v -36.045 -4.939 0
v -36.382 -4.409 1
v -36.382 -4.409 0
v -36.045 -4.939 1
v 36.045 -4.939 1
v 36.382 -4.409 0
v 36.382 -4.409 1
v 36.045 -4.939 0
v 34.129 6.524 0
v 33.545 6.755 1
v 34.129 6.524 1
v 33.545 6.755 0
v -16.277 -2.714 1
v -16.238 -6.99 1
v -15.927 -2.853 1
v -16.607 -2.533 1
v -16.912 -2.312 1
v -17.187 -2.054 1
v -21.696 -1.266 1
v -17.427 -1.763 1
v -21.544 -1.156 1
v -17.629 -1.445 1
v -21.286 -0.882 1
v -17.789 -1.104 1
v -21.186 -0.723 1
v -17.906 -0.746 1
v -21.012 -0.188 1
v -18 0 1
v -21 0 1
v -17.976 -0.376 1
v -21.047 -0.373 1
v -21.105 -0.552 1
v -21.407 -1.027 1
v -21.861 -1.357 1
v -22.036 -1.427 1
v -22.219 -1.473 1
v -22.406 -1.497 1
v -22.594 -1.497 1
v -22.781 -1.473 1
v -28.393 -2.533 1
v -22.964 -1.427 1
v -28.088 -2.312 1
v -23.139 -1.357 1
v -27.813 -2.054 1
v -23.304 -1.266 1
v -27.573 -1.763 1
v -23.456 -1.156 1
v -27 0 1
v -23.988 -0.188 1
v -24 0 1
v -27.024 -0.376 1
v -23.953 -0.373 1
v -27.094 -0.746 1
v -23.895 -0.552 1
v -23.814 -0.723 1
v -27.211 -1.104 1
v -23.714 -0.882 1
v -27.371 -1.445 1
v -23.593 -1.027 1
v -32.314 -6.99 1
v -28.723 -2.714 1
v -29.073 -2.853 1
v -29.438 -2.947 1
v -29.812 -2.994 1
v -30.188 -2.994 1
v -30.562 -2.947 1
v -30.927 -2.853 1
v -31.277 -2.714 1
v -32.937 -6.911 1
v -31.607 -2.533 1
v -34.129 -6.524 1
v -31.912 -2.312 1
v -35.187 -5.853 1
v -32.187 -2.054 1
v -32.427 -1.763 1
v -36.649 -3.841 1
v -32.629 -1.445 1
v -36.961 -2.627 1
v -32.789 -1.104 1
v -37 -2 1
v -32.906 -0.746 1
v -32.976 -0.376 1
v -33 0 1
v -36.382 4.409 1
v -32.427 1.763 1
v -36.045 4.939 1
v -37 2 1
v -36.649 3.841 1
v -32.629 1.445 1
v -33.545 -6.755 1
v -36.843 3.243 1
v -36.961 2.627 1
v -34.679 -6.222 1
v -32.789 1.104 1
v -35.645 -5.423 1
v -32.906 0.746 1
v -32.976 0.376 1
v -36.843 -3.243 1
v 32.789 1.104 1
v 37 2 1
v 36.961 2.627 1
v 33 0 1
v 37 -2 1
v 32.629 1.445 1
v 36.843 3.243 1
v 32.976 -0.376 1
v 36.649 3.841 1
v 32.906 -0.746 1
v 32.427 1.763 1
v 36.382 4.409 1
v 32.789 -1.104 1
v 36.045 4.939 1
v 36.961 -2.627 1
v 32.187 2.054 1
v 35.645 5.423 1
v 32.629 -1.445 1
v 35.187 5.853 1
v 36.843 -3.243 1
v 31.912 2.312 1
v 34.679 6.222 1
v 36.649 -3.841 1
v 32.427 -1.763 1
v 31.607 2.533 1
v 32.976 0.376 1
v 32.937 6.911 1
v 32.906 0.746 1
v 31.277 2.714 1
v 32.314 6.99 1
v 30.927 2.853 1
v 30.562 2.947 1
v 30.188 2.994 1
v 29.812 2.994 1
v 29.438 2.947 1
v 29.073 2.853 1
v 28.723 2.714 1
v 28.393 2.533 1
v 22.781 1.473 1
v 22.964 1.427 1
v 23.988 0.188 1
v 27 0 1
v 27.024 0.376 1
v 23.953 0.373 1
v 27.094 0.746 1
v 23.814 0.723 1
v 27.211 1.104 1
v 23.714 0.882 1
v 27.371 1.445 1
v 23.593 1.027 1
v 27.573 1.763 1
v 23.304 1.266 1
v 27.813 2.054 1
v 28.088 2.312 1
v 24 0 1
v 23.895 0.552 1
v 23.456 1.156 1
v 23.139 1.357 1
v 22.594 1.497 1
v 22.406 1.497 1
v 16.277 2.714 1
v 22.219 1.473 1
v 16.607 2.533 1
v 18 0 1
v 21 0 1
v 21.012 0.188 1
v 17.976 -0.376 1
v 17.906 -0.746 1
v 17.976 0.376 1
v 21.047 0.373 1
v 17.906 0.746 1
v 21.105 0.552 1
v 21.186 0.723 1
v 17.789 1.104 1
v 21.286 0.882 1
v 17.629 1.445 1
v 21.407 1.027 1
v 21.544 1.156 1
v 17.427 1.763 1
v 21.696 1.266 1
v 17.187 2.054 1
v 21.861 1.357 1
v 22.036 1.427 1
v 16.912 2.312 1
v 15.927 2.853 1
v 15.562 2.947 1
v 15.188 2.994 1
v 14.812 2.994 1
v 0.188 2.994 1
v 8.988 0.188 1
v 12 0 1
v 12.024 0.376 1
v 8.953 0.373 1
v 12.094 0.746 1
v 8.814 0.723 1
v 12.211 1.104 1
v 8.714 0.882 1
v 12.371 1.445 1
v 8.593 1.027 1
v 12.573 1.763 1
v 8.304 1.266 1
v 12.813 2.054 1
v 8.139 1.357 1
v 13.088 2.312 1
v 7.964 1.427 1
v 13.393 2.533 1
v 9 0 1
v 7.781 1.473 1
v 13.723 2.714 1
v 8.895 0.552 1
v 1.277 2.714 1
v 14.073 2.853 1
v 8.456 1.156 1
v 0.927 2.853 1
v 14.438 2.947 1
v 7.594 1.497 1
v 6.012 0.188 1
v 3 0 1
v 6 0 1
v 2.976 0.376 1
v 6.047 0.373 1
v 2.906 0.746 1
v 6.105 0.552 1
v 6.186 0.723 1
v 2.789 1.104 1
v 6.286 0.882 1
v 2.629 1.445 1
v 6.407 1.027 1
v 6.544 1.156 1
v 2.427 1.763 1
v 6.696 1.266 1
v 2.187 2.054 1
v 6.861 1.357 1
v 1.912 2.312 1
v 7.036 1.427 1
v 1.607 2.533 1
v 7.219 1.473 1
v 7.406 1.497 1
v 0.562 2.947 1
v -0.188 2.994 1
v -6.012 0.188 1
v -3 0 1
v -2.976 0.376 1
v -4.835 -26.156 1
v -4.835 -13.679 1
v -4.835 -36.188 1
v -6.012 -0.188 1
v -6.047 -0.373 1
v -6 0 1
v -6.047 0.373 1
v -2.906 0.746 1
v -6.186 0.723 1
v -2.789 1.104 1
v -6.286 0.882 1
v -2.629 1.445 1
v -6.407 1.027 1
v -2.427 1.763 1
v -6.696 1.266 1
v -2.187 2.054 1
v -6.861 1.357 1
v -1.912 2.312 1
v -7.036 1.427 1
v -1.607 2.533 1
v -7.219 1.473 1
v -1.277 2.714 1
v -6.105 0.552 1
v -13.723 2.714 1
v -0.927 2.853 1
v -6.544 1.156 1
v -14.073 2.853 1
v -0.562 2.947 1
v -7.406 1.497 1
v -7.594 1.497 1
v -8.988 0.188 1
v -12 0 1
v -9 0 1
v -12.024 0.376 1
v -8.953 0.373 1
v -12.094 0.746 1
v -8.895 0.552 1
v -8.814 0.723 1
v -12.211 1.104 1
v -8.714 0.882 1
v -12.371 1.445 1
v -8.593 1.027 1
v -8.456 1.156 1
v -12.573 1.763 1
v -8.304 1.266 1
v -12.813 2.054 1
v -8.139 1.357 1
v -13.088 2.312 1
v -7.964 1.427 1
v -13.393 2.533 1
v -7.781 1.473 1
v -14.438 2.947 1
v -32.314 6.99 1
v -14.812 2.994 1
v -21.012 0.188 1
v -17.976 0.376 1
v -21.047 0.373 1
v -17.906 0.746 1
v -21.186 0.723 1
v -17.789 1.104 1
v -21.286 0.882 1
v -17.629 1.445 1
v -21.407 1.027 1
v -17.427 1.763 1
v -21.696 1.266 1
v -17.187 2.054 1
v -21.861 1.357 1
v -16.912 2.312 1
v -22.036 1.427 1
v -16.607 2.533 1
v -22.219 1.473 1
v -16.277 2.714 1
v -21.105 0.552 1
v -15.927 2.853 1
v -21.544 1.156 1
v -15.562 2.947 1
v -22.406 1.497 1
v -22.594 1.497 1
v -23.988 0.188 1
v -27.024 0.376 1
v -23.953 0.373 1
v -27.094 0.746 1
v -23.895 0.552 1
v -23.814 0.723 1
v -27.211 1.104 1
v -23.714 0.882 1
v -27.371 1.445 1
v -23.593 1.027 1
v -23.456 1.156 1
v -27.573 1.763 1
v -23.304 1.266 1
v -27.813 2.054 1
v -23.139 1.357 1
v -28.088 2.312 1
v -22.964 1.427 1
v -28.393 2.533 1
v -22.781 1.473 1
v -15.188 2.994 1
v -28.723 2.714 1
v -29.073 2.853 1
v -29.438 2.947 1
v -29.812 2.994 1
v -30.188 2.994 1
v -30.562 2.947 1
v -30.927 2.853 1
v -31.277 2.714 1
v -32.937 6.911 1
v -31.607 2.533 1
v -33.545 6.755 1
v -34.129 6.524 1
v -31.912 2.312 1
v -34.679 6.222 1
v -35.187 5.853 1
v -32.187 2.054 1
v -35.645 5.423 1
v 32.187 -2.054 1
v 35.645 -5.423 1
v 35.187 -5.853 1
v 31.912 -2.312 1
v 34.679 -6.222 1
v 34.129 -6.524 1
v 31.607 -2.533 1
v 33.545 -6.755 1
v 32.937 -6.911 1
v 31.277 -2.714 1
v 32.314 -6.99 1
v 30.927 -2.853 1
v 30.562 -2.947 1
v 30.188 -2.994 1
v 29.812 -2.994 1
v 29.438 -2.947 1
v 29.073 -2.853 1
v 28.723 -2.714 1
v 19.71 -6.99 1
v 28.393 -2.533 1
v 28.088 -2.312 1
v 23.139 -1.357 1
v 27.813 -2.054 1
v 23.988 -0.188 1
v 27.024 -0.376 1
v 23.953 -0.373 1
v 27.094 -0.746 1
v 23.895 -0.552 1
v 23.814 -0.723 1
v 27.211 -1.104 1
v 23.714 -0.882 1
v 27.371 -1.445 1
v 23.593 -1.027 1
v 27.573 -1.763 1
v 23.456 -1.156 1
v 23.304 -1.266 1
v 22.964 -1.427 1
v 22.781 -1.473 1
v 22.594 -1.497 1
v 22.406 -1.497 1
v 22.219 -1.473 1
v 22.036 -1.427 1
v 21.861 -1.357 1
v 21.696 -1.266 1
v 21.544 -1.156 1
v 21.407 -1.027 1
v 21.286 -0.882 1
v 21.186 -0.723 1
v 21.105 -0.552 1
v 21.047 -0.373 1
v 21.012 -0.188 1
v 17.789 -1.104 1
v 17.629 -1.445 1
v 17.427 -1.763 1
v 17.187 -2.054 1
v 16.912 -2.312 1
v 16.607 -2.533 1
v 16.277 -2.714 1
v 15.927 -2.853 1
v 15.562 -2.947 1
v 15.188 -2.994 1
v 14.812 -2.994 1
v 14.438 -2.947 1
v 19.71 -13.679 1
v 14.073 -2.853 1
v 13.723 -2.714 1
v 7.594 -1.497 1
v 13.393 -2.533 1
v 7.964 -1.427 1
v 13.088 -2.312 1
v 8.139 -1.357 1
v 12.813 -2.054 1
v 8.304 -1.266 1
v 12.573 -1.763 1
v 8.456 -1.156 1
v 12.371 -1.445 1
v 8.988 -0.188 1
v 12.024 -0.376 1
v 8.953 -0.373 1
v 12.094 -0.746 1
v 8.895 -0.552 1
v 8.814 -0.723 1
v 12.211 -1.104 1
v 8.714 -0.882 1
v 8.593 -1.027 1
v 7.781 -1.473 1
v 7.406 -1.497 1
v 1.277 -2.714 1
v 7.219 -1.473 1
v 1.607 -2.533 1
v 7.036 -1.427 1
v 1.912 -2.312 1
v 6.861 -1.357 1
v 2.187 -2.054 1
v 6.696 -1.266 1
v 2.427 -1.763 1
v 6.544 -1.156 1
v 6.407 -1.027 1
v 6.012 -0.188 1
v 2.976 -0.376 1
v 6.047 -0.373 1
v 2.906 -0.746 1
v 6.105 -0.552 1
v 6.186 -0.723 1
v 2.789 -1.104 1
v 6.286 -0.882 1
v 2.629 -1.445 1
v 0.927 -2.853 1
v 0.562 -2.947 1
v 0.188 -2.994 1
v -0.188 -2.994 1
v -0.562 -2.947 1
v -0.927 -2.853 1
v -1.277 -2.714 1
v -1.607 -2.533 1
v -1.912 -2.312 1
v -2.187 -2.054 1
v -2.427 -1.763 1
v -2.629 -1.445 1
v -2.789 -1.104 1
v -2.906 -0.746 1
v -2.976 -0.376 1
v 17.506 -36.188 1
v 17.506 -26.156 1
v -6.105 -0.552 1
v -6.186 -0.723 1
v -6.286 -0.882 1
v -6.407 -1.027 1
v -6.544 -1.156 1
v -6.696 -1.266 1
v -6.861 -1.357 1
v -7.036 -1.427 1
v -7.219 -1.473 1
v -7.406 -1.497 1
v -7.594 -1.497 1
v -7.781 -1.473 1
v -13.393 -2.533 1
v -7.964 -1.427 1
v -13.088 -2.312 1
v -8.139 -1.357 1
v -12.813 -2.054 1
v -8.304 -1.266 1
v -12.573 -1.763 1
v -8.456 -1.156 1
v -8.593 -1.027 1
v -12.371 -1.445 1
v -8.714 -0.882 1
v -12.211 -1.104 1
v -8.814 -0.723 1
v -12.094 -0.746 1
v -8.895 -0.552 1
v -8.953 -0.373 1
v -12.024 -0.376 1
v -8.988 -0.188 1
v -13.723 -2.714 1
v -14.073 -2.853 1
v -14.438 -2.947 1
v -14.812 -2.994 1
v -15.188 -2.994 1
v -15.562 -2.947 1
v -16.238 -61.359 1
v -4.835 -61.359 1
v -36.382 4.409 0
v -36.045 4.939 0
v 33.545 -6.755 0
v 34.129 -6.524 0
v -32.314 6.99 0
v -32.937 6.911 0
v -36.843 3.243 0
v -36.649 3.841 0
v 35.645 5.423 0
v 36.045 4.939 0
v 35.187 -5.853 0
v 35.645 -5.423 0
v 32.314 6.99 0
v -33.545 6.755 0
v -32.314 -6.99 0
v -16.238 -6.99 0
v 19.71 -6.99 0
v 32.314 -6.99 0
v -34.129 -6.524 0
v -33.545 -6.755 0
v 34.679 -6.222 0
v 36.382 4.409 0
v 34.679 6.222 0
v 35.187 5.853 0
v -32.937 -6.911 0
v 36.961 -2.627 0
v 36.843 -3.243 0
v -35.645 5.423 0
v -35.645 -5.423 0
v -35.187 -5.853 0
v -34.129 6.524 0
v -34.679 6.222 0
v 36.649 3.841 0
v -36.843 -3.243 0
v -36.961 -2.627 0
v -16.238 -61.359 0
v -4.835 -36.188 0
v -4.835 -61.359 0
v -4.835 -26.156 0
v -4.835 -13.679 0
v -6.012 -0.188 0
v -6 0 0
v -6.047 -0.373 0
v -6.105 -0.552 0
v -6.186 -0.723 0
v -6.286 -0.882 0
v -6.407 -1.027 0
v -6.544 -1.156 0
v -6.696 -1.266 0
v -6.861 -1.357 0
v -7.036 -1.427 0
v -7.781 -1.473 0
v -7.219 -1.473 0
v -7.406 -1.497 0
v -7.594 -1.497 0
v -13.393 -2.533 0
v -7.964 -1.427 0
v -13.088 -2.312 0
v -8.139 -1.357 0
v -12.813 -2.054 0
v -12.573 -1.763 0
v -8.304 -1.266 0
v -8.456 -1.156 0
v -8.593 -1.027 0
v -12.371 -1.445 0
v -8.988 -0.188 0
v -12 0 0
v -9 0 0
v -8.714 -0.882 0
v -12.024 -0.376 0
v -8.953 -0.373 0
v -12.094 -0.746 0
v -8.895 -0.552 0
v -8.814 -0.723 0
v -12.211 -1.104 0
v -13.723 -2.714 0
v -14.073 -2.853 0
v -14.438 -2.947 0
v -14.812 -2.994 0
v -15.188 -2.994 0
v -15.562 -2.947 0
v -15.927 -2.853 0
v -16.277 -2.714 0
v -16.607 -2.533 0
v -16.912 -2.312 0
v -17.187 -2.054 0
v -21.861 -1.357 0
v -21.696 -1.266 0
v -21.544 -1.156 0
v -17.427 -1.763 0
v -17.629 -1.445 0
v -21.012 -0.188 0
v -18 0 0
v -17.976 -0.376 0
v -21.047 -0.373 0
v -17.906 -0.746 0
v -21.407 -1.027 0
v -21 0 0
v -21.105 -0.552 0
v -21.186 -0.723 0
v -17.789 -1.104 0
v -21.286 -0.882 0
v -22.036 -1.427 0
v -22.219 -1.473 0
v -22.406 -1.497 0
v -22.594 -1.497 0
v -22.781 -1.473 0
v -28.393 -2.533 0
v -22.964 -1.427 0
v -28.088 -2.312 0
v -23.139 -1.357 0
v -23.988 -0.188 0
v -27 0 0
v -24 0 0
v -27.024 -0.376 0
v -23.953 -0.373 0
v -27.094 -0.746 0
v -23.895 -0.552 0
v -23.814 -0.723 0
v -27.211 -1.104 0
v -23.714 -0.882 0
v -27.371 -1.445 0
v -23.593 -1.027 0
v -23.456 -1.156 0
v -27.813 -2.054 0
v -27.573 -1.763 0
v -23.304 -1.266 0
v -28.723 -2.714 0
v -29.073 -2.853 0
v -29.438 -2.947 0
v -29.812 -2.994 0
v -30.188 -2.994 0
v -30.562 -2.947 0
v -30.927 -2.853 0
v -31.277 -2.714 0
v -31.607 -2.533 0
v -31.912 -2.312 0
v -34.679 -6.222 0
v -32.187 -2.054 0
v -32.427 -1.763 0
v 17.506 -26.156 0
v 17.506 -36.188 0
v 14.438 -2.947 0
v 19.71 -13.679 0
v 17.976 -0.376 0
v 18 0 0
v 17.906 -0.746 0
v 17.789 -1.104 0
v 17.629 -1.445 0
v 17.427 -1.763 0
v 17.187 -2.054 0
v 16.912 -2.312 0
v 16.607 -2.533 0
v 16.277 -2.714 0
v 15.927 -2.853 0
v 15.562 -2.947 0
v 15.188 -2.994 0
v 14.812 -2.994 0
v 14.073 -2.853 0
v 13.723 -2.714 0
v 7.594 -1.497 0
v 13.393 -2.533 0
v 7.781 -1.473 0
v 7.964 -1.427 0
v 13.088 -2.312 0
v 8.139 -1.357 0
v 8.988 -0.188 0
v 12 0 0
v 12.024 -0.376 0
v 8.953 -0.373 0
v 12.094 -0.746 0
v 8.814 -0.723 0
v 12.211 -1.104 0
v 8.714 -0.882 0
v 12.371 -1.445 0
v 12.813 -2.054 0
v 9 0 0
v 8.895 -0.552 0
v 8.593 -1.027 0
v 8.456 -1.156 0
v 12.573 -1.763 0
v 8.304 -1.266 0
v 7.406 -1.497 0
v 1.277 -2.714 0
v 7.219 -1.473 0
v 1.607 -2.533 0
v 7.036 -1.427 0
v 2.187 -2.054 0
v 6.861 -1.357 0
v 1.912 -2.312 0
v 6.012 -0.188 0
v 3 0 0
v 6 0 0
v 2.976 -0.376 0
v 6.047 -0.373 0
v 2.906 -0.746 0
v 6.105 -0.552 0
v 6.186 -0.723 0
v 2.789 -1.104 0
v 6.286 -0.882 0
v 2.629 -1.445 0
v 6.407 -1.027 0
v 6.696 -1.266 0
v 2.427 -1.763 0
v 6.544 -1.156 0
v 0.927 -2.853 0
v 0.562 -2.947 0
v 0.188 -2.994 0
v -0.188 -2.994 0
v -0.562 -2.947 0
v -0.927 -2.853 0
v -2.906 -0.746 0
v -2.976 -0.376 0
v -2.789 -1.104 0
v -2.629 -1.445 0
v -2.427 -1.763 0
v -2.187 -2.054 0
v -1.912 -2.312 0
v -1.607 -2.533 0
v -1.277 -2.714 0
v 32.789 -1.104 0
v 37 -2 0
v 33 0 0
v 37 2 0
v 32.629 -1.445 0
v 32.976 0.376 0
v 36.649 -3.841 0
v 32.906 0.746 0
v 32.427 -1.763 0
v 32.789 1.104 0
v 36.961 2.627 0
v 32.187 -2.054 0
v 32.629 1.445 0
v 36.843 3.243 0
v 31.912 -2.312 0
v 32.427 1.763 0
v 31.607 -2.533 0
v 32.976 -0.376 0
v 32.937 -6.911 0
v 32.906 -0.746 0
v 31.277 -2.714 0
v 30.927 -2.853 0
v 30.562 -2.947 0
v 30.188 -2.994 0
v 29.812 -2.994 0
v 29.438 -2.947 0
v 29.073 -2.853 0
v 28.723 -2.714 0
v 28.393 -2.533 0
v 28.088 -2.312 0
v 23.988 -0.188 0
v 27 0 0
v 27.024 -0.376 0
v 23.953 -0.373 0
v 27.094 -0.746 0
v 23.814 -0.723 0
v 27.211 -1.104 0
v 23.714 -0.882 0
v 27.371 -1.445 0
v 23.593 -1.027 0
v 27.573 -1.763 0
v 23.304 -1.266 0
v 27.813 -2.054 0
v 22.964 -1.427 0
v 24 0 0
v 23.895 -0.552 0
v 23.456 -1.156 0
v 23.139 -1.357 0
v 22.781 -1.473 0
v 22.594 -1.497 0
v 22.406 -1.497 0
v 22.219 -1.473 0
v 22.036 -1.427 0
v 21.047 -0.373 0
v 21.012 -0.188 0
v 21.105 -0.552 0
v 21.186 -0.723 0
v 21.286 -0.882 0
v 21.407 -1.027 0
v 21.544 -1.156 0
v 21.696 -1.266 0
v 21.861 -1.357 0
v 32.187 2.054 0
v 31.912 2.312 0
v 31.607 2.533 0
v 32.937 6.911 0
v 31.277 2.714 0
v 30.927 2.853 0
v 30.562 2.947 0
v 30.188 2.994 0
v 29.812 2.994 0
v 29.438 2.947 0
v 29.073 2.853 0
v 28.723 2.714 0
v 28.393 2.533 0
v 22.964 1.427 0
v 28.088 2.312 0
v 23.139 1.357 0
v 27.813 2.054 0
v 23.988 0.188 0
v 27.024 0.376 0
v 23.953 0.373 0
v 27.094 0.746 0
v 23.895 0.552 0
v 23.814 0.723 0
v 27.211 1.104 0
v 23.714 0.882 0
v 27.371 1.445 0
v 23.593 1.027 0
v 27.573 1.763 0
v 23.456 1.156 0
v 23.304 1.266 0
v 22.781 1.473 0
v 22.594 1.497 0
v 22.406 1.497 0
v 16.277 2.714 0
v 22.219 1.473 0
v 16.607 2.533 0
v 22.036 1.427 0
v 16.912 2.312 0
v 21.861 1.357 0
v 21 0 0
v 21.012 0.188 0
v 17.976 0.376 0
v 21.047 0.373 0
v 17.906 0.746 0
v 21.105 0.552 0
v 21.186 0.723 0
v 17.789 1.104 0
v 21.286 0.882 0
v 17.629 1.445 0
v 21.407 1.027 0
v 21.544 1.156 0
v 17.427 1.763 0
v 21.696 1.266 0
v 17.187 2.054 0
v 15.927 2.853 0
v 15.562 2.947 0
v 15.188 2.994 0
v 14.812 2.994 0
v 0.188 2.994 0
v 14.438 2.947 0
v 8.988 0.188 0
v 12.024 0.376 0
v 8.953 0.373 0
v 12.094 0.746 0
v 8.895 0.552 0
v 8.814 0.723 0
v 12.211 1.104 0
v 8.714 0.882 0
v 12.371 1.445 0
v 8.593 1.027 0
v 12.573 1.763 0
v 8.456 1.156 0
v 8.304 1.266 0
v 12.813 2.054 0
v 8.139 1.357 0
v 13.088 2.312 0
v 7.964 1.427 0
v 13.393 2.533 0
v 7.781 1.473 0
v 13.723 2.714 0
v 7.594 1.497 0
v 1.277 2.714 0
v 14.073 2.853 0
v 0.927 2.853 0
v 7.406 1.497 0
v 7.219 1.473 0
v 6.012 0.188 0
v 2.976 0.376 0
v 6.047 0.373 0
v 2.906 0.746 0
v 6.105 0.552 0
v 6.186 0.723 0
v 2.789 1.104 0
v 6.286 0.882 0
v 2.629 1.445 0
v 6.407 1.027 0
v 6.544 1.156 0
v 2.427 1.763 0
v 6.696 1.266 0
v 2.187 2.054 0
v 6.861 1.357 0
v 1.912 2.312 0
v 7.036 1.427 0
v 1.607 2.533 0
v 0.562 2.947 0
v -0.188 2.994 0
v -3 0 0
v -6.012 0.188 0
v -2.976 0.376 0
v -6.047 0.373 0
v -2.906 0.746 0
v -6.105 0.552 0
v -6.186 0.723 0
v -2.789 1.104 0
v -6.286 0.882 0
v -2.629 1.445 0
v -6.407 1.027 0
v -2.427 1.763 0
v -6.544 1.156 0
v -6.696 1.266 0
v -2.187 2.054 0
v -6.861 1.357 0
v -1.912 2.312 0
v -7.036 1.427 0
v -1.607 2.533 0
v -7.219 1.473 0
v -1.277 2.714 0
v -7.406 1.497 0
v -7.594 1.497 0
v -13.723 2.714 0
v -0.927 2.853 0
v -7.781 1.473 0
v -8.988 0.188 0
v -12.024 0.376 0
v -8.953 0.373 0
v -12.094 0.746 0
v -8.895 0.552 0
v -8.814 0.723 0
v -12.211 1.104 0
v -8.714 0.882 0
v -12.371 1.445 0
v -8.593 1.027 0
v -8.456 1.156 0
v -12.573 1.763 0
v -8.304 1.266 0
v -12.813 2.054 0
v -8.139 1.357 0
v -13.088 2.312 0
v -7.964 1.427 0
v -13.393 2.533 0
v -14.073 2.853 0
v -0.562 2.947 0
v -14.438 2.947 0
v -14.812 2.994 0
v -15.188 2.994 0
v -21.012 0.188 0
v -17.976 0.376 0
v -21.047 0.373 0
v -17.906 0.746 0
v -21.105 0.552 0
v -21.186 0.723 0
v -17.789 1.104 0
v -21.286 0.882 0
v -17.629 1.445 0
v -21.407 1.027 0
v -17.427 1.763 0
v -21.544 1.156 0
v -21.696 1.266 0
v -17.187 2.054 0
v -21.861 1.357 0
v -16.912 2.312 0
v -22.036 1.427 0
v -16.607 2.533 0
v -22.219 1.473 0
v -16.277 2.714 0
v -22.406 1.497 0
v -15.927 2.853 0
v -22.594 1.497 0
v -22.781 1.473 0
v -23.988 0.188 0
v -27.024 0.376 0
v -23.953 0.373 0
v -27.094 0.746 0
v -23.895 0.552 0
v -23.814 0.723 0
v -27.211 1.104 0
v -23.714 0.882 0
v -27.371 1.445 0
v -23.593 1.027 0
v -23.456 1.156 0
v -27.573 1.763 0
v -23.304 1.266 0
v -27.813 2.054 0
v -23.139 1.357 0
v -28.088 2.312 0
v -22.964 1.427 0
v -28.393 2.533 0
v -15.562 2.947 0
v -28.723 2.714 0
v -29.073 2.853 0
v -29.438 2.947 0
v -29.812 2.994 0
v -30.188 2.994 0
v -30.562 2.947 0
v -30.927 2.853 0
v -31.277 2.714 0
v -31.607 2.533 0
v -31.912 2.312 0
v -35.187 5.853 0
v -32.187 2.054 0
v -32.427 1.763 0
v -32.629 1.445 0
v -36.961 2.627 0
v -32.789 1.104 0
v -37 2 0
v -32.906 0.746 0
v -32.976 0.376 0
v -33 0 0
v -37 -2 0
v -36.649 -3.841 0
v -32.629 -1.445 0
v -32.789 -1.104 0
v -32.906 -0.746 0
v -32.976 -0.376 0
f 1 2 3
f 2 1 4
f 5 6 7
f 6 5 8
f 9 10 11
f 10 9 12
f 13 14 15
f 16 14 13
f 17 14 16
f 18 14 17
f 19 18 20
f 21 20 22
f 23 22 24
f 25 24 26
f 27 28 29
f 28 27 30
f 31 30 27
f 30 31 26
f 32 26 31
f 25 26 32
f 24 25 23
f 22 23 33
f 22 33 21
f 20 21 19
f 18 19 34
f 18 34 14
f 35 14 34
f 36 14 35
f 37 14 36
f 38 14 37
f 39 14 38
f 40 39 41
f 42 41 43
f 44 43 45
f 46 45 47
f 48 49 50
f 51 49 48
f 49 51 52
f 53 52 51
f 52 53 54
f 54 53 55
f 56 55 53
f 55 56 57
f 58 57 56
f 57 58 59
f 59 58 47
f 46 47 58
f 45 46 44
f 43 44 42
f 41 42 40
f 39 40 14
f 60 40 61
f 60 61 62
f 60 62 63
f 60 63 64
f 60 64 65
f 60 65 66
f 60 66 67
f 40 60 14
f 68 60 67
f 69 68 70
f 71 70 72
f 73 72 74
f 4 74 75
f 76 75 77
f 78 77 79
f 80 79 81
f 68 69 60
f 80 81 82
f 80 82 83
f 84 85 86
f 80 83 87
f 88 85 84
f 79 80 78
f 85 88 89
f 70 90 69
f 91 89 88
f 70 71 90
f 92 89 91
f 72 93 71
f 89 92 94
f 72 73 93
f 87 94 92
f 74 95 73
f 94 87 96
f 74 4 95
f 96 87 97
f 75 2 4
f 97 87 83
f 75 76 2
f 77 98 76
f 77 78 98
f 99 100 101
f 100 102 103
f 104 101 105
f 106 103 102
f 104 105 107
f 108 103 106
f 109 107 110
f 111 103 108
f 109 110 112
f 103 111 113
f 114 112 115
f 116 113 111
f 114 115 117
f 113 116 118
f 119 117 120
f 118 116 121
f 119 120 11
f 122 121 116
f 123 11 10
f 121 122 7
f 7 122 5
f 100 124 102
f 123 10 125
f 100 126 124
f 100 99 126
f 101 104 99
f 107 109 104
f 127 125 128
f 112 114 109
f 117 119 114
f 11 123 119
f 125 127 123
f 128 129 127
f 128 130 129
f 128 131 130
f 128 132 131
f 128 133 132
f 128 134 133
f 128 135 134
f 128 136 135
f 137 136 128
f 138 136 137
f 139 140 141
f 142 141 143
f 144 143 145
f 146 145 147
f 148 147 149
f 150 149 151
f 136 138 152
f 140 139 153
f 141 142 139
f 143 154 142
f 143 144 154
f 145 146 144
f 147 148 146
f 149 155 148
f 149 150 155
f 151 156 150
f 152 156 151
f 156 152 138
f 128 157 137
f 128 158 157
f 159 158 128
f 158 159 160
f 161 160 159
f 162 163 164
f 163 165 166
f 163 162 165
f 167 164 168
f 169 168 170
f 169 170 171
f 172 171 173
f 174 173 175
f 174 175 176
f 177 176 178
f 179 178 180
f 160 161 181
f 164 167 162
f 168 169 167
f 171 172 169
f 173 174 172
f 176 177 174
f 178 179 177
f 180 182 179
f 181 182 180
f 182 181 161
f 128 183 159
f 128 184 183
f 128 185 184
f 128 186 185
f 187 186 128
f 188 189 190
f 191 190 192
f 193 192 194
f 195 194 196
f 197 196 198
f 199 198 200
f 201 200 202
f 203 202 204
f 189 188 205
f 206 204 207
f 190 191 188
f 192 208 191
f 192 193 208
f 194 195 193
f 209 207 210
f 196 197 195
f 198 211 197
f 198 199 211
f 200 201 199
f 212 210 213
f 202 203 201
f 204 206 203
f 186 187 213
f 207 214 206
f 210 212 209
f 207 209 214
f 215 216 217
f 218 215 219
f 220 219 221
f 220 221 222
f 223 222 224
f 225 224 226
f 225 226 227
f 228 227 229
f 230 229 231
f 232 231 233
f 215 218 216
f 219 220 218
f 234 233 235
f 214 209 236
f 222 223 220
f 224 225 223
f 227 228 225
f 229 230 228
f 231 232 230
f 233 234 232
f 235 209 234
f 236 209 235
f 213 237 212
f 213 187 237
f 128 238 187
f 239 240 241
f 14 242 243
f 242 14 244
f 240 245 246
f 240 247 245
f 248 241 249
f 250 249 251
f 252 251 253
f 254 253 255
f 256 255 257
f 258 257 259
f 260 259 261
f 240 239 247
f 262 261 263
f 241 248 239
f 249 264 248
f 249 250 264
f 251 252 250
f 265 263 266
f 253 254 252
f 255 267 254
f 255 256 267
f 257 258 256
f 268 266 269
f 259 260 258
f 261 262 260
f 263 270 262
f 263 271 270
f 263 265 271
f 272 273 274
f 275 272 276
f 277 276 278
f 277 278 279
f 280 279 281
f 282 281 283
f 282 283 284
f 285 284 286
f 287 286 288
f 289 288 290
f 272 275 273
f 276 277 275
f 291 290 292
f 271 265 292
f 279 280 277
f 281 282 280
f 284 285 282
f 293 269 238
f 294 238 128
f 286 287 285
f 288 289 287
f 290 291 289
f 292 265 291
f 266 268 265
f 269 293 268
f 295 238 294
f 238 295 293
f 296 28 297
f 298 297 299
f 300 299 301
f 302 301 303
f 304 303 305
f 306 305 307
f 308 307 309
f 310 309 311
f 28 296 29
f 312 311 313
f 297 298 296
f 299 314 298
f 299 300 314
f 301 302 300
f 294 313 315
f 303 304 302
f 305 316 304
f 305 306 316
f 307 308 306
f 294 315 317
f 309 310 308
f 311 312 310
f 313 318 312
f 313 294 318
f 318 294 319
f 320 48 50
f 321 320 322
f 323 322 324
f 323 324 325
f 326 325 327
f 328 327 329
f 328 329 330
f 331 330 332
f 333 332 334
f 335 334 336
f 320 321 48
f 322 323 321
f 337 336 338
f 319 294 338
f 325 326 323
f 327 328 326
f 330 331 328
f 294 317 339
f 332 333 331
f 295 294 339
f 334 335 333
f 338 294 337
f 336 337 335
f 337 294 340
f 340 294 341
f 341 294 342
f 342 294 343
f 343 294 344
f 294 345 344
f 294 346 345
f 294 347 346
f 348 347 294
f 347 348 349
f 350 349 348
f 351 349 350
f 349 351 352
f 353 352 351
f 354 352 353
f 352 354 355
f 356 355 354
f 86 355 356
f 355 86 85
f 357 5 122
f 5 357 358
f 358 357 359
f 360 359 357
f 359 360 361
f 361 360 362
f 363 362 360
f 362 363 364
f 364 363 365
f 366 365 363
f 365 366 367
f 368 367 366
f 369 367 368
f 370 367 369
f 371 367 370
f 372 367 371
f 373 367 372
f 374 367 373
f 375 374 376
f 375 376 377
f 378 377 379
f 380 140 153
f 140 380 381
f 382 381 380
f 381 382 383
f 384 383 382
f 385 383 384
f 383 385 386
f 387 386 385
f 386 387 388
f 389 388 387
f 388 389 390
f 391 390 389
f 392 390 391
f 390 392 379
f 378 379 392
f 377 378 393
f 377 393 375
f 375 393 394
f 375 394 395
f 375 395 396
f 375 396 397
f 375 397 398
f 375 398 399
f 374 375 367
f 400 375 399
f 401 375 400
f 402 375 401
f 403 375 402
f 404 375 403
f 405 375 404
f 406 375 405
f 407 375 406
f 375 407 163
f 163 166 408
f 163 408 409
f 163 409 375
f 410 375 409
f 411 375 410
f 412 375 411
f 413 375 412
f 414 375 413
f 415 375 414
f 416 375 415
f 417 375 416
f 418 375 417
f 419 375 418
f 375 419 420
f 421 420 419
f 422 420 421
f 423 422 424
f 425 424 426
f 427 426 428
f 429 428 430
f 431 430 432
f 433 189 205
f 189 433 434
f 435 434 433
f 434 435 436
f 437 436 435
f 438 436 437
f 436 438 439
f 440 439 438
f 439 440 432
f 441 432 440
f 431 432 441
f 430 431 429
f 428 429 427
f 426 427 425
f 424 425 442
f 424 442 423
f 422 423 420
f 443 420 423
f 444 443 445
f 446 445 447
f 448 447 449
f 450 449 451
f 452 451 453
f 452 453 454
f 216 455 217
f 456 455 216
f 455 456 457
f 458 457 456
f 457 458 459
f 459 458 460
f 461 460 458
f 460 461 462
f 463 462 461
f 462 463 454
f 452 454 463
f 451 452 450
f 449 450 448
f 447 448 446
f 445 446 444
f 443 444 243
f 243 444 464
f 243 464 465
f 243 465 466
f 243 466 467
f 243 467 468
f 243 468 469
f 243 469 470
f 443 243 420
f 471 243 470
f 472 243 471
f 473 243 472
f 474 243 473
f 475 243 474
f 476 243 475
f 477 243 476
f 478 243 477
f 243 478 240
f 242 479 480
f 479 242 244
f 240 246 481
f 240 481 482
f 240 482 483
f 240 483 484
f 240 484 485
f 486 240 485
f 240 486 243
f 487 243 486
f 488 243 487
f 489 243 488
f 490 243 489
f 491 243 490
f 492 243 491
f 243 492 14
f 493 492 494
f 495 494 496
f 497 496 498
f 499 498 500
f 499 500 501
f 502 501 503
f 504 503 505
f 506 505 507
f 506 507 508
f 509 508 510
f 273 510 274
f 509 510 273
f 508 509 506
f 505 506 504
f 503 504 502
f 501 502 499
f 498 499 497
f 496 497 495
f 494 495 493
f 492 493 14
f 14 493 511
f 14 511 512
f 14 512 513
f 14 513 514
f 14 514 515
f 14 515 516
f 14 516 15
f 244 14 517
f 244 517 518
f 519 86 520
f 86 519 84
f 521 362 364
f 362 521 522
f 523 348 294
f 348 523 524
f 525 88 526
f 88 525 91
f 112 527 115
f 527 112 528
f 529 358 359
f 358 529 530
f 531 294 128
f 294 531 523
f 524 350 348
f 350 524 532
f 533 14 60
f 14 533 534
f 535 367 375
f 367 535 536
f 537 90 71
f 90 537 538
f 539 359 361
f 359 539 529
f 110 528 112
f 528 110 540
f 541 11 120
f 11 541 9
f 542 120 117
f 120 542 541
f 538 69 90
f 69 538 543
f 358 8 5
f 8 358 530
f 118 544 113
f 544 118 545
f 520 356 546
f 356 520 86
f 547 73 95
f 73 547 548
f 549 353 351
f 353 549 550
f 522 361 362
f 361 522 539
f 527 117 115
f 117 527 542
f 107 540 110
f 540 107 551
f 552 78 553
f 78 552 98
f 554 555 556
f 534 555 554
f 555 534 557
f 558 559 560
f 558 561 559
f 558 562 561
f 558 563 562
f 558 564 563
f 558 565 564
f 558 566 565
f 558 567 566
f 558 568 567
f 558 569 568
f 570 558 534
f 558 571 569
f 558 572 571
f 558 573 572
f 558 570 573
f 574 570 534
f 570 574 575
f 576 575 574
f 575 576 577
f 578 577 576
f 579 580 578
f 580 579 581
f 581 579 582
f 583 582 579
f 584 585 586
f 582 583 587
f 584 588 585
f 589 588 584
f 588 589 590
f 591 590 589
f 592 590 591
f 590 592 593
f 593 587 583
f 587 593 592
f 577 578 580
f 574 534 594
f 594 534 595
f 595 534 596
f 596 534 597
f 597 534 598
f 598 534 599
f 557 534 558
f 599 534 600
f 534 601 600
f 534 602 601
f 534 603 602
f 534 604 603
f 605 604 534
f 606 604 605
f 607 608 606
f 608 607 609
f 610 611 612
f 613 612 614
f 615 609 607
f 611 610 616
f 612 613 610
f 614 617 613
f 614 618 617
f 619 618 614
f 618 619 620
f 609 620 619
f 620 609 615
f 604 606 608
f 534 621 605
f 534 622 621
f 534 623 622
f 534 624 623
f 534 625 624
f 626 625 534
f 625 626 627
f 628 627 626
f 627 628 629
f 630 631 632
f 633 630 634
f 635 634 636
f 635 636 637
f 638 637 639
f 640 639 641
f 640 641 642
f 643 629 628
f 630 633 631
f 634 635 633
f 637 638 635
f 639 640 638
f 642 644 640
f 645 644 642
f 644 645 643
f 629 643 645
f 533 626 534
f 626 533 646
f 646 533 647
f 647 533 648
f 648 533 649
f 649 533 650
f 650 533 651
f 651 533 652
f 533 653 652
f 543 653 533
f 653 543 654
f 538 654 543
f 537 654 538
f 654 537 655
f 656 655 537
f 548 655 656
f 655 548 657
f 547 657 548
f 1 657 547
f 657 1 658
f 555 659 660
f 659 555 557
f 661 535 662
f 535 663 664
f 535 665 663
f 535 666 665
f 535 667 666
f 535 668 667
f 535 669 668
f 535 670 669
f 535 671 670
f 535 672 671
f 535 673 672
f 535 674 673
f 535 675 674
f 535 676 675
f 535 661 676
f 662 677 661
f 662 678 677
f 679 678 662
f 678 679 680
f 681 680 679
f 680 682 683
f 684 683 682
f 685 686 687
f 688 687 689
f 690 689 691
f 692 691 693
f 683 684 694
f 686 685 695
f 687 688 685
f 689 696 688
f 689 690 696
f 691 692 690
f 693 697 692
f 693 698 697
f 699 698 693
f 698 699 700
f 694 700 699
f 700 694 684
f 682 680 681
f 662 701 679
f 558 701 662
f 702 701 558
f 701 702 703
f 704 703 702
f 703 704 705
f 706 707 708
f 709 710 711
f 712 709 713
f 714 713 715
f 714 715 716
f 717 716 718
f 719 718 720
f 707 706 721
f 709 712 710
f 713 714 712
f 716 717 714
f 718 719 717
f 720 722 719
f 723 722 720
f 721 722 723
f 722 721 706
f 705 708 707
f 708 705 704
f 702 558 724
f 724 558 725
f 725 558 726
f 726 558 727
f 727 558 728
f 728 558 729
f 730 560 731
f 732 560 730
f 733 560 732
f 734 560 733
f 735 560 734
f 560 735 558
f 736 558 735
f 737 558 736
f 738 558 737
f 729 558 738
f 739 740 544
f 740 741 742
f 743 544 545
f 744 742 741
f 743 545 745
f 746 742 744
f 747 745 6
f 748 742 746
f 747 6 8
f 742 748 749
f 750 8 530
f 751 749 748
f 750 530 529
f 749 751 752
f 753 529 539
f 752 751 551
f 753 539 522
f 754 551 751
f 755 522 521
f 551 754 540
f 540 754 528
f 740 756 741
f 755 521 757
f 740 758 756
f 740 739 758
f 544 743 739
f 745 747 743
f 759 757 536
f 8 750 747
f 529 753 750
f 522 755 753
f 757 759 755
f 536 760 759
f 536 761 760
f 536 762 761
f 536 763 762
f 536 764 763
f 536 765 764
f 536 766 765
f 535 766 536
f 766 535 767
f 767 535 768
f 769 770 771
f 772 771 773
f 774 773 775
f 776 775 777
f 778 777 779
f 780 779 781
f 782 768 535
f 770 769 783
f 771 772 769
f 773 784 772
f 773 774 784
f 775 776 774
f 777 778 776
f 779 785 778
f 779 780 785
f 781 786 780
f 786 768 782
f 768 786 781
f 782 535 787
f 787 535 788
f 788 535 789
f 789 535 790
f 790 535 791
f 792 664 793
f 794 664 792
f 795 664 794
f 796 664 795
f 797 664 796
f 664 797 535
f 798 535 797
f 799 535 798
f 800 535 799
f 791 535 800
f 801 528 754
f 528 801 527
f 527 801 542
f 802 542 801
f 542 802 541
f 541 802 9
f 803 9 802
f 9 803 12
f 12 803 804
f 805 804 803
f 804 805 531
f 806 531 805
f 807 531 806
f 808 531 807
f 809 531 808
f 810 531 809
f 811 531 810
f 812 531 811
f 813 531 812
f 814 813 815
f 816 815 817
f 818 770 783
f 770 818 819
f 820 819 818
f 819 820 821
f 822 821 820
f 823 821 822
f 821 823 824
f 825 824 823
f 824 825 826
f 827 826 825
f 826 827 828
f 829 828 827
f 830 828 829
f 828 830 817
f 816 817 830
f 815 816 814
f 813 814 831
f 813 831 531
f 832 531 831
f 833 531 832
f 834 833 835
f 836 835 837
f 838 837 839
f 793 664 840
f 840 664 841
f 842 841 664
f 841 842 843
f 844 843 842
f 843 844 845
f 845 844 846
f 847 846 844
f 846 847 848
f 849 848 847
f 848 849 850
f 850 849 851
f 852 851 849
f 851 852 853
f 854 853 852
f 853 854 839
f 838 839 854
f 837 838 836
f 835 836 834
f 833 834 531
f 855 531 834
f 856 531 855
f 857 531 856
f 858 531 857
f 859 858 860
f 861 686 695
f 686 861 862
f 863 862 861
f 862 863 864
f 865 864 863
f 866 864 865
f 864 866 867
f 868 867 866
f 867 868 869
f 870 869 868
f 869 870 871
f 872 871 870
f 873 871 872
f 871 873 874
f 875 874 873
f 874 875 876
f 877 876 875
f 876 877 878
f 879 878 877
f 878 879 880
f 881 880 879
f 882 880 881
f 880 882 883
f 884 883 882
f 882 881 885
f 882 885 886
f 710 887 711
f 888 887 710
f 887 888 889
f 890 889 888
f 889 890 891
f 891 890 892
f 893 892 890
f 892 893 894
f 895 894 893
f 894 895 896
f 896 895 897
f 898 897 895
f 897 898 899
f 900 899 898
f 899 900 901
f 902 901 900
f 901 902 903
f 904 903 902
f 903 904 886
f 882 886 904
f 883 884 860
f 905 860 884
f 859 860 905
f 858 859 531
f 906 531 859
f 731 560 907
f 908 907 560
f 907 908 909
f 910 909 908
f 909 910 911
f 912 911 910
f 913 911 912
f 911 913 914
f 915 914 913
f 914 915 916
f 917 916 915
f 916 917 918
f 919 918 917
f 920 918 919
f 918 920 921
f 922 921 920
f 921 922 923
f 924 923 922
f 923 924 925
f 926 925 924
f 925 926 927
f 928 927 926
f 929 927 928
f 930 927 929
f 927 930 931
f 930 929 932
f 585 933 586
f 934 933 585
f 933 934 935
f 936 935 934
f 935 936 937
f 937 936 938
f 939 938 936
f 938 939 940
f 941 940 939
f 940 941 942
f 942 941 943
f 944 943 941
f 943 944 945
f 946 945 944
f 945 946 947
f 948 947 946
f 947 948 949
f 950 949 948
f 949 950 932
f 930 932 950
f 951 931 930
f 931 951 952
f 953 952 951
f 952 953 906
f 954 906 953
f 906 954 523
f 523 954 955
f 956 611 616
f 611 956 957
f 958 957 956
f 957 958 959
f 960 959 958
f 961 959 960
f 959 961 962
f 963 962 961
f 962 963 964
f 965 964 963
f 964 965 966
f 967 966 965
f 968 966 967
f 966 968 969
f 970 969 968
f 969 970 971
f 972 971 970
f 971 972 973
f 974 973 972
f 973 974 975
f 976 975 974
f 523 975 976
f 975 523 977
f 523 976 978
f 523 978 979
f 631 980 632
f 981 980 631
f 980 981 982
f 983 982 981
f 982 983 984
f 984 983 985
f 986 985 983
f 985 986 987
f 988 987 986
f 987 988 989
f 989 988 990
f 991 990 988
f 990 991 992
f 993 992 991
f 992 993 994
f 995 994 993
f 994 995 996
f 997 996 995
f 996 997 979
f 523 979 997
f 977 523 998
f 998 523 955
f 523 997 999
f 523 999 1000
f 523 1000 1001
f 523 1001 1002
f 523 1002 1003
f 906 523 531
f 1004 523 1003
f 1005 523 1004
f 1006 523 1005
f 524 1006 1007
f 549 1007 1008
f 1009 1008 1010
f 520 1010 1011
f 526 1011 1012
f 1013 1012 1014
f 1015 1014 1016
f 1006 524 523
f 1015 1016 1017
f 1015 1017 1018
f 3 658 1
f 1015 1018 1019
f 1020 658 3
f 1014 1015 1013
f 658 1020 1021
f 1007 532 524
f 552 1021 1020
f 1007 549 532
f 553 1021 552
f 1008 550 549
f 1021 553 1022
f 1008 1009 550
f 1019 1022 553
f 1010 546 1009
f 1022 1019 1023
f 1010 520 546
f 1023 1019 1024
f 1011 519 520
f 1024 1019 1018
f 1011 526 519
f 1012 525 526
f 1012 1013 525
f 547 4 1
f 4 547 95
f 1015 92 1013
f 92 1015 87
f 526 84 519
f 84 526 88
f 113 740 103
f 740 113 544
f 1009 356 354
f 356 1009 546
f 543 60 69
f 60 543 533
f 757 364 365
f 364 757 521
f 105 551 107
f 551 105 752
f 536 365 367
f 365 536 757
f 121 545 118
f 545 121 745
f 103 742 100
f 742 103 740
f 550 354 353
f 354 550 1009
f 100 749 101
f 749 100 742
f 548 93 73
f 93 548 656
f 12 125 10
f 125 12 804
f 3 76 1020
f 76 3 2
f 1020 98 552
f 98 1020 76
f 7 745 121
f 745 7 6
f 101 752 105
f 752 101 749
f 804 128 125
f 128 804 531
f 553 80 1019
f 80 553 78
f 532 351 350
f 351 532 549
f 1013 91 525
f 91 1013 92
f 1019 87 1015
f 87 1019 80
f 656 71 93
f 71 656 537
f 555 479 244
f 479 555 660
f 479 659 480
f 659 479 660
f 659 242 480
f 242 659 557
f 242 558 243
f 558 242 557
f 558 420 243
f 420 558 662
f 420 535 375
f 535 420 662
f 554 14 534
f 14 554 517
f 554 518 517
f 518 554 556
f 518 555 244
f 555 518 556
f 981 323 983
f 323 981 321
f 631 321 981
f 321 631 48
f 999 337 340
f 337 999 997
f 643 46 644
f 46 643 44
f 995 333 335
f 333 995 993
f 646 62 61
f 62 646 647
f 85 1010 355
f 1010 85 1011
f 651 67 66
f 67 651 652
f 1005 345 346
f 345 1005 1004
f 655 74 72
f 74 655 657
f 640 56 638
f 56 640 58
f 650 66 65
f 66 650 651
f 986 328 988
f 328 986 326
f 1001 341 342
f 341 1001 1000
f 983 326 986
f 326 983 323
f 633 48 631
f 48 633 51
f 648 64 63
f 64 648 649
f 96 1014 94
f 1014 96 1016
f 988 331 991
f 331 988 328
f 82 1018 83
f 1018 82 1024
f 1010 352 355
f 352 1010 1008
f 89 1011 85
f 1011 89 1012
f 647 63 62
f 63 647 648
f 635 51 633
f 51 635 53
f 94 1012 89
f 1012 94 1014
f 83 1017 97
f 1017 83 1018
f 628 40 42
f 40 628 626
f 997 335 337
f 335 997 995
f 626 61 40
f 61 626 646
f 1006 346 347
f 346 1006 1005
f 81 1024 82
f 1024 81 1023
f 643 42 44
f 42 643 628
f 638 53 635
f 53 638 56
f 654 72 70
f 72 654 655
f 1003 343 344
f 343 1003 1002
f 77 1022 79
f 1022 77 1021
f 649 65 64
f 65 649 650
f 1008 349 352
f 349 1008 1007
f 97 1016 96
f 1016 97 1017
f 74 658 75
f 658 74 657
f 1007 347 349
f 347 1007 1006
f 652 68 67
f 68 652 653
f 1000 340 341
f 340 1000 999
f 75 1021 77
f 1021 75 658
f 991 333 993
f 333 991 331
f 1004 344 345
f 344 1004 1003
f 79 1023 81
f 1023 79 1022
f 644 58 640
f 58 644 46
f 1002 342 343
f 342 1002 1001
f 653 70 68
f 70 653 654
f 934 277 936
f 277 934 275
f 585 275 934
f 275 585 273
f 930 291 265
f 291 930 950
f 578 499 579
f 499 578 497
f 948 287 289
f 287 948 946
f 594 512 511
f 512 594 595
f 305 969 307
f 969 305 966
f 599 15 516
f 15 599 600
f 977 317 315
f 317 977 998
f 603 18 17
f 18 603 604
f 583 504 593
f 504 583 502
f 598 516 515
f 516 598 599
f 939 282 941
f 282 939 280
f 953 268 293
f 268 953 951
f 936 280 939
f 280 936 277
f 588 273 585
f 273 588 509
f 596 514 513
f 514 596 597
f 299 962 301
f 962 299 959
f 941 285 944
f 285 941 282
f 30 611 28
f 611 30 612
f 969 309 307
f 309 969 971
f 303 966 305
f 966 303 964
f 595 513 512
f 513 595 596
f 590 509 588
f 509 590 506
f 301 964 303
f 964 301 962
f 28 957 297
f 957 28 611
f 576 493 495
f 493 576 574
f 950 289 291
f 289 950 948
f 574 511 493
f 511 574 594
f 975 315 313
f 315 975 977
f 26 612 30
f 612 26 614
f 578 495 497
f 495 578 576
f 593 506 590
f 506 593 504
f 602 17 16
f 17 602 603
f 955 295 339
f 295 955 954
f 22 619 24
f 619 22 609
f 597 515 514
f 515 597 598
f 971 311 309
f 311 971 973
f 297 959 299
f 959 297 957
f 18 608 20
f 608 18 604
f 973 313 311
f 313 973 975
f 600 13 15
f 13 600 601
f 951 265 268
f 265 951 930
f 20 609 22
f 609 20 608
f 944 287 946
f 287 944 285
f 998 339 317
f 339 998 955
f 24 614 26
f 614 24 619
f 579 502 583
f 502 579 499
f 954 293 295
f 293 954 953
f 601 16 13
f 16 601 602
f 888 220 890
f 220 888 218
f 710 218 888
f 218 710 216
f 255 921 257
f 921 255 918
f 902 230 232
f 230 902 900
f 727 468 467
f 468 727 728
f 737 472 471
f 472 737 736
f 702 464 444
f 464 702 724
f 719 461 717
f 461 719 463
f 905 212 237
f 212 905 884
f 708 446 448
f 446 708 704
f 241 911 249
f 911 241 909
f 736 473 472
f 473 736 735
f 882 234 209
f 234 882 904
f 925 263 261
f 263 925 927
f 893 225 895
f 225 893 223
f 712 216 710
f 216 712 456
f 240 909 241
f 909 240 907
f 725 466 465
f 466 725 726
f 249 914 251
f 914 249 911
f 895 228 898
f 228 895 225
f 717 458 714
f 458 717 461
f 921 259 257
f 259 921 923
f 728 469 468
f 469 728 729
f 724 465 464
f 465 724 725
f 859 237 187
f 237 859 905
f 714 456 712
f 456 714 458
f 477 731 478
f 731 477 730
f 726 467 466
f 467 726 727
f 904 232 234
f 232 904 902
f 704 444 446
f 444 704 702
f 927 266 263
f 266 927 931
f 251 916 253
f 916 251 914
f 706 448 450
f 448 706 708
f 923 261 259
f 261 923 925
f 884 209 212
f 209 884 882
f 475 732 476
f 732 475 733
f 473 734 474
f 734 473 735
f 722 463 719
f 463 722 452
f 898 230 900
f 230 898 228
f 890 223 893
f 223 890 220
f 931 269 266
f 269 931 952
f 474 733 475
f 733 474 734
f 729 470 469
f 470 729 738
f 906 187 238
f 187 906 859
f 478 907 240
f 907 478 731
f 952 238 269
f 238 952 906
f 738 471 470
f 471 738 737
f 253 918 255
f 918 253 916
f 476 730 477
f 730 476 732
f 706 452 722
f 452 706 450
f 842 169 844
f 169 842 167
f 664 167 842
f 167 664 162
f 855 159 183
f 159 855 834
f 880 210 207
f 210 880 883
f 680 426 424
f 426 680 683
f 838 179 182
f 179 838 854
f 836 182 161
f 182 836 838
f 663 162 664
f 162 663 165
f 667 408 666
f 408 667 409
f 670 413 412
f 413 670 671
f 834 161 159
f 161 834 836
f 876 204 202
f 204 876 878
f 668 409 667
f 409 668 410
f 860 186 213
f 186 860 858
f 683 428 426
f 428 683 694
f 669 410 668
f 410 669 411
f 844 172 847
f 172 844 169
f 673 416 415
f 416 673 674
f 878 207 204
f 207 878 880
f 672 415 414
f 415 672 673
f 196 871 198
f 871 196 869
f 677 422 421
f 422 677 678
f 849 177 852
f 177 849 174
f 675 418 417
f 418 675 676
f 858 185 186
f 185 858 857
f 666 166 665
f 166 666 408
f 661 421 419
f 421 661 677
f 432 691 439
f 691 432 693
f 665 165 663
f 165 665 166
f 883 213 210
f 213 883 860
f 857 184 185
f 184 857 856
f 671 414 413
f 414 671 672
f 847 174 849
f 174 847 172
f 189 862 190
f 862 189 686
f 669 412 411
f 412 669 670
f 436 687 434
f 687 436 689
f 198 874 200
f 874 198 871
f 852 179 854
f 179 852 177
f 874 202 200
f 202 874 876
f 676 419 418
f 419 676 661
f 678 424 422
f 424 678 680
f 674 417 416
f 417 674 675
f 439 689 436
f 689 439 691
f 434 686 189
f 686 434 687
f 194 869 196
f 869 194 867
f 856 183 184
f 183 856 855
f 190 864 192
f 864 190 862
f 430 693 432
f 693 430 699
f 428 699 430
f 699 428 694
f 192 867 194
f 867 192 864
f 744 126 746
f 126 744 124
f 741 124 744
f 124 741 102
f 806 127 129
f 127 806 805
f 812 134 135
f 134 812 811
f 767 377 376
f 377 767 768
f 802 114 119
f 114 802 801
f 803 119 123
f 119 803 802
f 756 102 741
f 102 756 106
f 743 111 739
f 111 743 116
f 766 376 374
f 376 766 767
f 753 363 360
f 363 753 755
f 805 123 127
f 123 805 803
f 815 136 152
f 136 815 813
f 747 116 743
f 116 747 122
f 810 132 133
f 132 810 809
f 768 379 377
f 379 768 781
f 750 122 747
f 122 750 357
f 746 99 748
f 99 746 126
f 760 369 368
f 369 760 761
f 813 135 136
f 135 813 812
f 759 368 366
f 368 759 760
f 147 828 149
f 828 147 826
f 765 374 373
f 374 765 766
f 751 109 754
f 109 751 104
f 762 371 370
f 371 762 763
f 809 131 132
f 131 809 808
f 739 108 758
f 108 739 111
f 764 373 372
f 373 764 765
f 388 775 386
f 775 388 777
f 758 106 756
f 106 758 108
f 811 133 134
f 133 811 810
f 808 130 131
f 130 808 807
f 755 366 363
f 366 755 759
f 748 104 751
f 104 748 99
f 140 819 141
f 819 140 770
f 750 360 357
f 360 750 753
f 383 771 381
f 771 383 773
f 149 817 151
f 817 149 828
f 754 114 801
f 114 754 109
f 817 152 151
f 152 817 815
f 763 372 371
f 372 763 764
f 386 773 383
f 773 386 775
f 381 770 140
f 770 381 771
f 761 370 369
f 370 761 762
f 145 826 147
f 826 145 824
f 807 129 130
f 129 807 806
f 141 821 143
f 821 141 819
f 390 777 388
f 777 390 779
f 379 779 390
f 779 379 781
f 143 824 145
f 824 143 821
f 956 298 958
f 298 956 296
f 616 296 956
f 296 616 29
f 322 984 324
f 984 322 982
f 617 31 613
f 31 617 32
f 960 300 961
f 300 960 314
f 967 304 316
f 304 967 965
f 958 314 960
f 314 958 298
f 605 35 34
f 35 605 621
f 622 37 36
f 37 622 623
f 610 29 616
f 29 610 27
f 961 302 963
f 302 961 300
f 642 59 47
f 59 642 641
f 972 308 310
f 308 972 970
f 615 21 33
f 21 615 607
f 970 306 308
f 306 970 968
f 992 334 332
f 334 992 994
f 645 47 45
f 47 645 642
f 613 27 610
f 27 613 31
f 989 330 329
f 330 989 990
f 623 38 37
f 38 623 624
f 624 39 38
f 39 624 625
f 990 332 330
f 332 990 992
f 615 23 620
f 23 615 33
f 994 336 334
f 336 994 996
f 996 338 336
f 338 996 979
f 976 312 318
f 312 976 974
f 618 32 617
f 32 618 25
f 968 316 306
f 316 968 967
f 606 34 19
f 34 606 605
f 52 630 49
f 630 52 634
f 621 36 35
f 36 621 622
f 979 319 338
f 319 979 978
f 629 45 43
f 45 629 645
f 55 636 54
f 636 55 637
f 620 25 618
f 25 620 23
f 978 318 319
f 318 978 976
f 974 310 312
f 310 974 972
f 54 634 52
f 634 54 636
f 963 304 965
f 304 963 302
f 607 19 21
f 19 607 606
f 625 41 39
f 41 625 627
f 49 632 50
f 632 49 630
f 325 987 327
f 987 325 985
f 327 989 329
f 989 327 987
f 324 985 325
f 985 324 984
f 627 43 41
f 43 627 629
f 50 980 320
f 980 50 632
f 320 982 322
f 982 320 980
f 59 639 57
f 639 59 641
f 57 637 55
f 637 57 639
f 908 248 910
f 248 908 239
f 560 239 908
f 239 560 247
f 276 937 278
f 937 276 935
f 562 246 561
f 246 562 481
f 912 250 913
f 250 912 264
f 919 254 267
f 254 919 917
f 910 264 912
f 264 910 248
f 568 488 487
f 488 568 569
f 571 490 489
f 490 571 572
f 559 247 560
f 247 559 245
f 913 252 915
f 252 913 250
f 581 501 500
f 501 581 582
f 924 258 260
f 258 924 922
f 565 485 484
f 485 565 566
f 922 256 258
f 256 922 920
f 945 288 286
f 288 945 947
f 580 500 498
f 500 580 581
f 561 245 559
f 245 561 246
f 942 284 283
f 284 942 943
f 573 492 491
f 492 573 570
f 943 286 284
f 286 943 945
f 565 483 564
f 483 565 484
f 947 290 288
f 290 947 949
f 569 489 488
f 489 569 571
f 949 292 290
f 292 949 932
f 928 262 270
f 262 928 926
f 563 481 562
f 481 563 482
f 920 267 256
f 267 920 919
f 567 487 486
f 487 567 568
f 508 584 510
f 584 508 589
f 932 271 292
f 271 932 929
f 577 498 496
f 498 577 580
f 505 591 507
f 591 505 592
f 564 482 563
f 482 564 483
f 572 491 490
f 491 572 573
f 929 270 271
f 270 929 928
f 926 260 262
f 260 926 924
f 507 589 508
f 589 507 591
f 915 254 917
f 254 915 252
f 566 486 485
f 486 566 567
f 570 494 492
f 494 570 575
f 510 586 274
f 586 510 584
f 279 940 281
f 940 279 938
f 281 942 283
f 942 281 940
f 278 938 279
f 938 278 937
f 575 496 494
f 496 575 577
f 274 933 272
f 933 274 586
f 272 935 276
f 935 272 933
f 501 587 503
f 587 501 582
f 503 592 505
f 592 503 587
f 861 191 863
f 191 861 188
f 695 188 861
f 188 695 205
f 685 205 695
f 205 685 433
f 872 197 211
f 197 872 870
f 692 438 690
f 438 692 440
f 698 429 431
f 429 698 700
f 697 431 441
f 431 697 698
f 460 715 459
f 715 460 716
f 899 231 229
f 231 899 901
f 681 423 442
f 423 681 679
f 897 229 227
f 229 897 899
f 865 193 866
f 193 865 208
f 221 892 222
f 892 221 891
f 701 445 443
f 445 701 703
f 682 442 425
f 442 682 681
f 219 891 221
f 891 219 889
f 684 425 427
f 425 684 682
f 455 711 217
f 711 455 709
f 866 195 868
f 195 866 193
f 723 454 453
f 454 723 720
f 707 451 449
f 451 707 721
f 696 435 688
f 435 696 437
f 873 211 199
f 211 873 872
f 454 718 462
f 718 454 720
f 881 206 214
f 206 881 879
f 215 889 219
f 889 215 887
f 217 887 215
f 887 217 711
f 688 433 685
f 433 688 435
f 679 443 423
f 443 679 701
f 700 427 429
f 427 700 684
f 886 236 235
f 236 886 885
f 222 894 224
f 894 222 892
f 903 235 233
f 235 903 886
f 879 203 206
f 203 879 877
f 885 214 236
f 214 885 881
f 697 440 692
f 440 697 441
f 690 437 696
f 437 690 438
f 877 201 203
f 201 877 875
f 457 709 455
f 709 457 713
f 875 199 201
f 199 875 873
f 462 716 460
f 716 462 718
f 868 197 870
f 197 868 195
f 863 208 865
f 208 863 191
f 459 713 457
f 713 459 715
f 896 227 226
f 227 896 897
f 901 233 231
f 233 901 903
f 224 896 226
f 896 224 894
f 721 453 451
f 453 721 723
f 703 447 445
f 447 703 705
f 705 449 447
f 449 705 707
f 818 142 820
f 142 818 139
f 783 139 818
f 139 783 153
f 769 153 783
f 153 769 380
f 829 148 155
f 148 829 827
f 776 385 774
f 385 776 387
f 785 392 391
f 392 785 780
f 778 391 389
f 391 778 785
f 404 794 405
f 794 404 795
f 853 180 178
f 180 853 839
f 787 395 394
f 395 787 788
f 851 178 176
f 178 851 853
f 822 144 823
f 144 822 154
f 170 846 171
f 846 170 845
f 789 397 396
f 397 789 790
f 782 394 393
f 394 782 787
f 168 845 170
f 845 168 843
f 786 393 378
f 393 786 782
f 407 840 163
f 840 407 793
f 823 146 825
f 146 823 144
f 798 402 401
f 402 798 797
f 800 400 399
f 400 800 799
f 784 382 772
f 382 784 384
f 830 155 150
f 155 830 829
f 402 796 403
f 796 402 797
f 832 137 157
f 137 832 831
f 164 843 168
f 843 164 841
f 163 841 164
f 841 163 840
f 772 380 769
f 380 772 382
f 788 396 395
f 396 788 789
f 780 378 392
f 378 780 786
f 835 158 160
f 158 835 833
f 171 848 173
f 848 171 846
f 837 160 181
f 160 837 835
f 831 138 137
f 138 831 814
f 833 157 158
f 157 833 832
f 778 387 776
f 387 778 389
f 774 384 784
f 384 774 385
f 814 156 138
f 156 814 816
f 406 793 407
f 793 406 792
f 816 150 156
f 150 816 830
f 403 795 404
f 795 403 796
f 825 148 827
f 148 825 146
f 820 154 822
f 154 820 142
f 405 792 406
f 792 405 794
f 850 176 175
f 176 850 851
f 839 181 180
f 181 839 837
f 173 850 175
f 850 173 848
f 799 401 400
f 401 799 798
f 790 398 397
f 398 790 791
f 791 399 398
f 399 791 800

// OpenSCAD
$fn = 50;


difference() {
	union() {
		hull() {
			translate(v = [-32.0000000000, 2.0000000000, 0]) {
				cylinder(h = 1, r = 5);
			}
			translate(v = [32.0000000000, 2.0000000000, 0]) {
				cylinder(h = 1, r = 5);
			}
			translate(v = [-32.0000000000, -2.0000000000, 0]) {
				cylinder(h = 1, r = 5);
			}
			translate(v = [32.0000000000, -2.0000000000, 0]) {
				cylinder(h = 1, r = 5);
			}
		}
		translate(v = [0, -5, 0]) {
			linear_extrude(height = 1) {
				text(font = "DejaVu Sans Mono:style=Bold", halign = "center", size = 57.0000000000, text = "F", valign = "top");
			}
		}
	}
	union() {
		translate(v = [-30.0000000000, 0.0000000000, 0]) {
			translate(v = [0, 0, -100]) {
				cylinder(h = 200, r = 3.0000000000);
			}
		}
		translate(v = [-15.0000000000, 0.0000000000, 0]) {
			translate(v = [0, 0, -100]) {
				cylinder(h = 200, r = 3.0000000000);
			}
		}
		translate(v = [0, 0, -100]) {
			cylinder(h = 200, r = 3.0000000000);
		}
		translate(v = [15.0000000000, 0.0000000000, 0]) {
			translate(v = [0, 0, -100]) {
				cylinder(h = 200, r = 3.0000000000);
			}
		}
		translate(v = [30.0000000000, 0.0000000000, 0]) {
			translate(v = [0, 0, -100]) {
				cylinder(h = 200, r = 3.0000000000);
			}
		}
		translate(v = [-30.0000000000, 0.0000000000, 0]) {
			translate(v = [0, 0, -100]) {
				cylinder(h = 200, r = 1.5000000000);
			}
		}
		translate(v = [-22.5000000000, 0.0000000000, 0]) {
			translate(v = [0, 0, -100]) {
				cylinder(h = 200, r = 1.5000000000);
			}
		}
		translate(v = [-15.0000000000, 0.0000000000, 0]) {
			translate(v = [0, 0, -100]) {
				cylinder(h = 200, r = 1.5000000000);
			}
		}
		translate(v = [-7.5000000000, 0.0000000000, 0]) {
			translate(v = [0, 0, -100]) {
				cylinder(h = 200, r = 1.5000000000);
			}
		}
		translate(v = [0, 0, -100]) {
			cylinder(h = 200, r = 1.5000000000);
		}
		translate(v = [7.5000000000, 0.0000000000, 0]) {
			translate(v = [0, 0, -100]) {
				cylinder(h = 200, r = 1.5000000000);
			}
		}
		translate(v = [15.0000000000, 0.0000000000, 0]) {
			translate(v = [0, 0, -100]) {
				cylinder(h = 200, r = 1.5000000000);
			}
		}
		translate(v = [22.5000000000, 0.0000000000, 0]) {
			translate(v = [0, 0, -100]) {
				cylinder(h = 200, r = 1.5000000000);
			}
		}
		translate(v = [30.0000000000, 0.0000000000, 0]) {
			translate(v = [0, 0, -100]) {
				cylinder(h = 200, r = 1.5000000000);
			}
		}
	}
}
